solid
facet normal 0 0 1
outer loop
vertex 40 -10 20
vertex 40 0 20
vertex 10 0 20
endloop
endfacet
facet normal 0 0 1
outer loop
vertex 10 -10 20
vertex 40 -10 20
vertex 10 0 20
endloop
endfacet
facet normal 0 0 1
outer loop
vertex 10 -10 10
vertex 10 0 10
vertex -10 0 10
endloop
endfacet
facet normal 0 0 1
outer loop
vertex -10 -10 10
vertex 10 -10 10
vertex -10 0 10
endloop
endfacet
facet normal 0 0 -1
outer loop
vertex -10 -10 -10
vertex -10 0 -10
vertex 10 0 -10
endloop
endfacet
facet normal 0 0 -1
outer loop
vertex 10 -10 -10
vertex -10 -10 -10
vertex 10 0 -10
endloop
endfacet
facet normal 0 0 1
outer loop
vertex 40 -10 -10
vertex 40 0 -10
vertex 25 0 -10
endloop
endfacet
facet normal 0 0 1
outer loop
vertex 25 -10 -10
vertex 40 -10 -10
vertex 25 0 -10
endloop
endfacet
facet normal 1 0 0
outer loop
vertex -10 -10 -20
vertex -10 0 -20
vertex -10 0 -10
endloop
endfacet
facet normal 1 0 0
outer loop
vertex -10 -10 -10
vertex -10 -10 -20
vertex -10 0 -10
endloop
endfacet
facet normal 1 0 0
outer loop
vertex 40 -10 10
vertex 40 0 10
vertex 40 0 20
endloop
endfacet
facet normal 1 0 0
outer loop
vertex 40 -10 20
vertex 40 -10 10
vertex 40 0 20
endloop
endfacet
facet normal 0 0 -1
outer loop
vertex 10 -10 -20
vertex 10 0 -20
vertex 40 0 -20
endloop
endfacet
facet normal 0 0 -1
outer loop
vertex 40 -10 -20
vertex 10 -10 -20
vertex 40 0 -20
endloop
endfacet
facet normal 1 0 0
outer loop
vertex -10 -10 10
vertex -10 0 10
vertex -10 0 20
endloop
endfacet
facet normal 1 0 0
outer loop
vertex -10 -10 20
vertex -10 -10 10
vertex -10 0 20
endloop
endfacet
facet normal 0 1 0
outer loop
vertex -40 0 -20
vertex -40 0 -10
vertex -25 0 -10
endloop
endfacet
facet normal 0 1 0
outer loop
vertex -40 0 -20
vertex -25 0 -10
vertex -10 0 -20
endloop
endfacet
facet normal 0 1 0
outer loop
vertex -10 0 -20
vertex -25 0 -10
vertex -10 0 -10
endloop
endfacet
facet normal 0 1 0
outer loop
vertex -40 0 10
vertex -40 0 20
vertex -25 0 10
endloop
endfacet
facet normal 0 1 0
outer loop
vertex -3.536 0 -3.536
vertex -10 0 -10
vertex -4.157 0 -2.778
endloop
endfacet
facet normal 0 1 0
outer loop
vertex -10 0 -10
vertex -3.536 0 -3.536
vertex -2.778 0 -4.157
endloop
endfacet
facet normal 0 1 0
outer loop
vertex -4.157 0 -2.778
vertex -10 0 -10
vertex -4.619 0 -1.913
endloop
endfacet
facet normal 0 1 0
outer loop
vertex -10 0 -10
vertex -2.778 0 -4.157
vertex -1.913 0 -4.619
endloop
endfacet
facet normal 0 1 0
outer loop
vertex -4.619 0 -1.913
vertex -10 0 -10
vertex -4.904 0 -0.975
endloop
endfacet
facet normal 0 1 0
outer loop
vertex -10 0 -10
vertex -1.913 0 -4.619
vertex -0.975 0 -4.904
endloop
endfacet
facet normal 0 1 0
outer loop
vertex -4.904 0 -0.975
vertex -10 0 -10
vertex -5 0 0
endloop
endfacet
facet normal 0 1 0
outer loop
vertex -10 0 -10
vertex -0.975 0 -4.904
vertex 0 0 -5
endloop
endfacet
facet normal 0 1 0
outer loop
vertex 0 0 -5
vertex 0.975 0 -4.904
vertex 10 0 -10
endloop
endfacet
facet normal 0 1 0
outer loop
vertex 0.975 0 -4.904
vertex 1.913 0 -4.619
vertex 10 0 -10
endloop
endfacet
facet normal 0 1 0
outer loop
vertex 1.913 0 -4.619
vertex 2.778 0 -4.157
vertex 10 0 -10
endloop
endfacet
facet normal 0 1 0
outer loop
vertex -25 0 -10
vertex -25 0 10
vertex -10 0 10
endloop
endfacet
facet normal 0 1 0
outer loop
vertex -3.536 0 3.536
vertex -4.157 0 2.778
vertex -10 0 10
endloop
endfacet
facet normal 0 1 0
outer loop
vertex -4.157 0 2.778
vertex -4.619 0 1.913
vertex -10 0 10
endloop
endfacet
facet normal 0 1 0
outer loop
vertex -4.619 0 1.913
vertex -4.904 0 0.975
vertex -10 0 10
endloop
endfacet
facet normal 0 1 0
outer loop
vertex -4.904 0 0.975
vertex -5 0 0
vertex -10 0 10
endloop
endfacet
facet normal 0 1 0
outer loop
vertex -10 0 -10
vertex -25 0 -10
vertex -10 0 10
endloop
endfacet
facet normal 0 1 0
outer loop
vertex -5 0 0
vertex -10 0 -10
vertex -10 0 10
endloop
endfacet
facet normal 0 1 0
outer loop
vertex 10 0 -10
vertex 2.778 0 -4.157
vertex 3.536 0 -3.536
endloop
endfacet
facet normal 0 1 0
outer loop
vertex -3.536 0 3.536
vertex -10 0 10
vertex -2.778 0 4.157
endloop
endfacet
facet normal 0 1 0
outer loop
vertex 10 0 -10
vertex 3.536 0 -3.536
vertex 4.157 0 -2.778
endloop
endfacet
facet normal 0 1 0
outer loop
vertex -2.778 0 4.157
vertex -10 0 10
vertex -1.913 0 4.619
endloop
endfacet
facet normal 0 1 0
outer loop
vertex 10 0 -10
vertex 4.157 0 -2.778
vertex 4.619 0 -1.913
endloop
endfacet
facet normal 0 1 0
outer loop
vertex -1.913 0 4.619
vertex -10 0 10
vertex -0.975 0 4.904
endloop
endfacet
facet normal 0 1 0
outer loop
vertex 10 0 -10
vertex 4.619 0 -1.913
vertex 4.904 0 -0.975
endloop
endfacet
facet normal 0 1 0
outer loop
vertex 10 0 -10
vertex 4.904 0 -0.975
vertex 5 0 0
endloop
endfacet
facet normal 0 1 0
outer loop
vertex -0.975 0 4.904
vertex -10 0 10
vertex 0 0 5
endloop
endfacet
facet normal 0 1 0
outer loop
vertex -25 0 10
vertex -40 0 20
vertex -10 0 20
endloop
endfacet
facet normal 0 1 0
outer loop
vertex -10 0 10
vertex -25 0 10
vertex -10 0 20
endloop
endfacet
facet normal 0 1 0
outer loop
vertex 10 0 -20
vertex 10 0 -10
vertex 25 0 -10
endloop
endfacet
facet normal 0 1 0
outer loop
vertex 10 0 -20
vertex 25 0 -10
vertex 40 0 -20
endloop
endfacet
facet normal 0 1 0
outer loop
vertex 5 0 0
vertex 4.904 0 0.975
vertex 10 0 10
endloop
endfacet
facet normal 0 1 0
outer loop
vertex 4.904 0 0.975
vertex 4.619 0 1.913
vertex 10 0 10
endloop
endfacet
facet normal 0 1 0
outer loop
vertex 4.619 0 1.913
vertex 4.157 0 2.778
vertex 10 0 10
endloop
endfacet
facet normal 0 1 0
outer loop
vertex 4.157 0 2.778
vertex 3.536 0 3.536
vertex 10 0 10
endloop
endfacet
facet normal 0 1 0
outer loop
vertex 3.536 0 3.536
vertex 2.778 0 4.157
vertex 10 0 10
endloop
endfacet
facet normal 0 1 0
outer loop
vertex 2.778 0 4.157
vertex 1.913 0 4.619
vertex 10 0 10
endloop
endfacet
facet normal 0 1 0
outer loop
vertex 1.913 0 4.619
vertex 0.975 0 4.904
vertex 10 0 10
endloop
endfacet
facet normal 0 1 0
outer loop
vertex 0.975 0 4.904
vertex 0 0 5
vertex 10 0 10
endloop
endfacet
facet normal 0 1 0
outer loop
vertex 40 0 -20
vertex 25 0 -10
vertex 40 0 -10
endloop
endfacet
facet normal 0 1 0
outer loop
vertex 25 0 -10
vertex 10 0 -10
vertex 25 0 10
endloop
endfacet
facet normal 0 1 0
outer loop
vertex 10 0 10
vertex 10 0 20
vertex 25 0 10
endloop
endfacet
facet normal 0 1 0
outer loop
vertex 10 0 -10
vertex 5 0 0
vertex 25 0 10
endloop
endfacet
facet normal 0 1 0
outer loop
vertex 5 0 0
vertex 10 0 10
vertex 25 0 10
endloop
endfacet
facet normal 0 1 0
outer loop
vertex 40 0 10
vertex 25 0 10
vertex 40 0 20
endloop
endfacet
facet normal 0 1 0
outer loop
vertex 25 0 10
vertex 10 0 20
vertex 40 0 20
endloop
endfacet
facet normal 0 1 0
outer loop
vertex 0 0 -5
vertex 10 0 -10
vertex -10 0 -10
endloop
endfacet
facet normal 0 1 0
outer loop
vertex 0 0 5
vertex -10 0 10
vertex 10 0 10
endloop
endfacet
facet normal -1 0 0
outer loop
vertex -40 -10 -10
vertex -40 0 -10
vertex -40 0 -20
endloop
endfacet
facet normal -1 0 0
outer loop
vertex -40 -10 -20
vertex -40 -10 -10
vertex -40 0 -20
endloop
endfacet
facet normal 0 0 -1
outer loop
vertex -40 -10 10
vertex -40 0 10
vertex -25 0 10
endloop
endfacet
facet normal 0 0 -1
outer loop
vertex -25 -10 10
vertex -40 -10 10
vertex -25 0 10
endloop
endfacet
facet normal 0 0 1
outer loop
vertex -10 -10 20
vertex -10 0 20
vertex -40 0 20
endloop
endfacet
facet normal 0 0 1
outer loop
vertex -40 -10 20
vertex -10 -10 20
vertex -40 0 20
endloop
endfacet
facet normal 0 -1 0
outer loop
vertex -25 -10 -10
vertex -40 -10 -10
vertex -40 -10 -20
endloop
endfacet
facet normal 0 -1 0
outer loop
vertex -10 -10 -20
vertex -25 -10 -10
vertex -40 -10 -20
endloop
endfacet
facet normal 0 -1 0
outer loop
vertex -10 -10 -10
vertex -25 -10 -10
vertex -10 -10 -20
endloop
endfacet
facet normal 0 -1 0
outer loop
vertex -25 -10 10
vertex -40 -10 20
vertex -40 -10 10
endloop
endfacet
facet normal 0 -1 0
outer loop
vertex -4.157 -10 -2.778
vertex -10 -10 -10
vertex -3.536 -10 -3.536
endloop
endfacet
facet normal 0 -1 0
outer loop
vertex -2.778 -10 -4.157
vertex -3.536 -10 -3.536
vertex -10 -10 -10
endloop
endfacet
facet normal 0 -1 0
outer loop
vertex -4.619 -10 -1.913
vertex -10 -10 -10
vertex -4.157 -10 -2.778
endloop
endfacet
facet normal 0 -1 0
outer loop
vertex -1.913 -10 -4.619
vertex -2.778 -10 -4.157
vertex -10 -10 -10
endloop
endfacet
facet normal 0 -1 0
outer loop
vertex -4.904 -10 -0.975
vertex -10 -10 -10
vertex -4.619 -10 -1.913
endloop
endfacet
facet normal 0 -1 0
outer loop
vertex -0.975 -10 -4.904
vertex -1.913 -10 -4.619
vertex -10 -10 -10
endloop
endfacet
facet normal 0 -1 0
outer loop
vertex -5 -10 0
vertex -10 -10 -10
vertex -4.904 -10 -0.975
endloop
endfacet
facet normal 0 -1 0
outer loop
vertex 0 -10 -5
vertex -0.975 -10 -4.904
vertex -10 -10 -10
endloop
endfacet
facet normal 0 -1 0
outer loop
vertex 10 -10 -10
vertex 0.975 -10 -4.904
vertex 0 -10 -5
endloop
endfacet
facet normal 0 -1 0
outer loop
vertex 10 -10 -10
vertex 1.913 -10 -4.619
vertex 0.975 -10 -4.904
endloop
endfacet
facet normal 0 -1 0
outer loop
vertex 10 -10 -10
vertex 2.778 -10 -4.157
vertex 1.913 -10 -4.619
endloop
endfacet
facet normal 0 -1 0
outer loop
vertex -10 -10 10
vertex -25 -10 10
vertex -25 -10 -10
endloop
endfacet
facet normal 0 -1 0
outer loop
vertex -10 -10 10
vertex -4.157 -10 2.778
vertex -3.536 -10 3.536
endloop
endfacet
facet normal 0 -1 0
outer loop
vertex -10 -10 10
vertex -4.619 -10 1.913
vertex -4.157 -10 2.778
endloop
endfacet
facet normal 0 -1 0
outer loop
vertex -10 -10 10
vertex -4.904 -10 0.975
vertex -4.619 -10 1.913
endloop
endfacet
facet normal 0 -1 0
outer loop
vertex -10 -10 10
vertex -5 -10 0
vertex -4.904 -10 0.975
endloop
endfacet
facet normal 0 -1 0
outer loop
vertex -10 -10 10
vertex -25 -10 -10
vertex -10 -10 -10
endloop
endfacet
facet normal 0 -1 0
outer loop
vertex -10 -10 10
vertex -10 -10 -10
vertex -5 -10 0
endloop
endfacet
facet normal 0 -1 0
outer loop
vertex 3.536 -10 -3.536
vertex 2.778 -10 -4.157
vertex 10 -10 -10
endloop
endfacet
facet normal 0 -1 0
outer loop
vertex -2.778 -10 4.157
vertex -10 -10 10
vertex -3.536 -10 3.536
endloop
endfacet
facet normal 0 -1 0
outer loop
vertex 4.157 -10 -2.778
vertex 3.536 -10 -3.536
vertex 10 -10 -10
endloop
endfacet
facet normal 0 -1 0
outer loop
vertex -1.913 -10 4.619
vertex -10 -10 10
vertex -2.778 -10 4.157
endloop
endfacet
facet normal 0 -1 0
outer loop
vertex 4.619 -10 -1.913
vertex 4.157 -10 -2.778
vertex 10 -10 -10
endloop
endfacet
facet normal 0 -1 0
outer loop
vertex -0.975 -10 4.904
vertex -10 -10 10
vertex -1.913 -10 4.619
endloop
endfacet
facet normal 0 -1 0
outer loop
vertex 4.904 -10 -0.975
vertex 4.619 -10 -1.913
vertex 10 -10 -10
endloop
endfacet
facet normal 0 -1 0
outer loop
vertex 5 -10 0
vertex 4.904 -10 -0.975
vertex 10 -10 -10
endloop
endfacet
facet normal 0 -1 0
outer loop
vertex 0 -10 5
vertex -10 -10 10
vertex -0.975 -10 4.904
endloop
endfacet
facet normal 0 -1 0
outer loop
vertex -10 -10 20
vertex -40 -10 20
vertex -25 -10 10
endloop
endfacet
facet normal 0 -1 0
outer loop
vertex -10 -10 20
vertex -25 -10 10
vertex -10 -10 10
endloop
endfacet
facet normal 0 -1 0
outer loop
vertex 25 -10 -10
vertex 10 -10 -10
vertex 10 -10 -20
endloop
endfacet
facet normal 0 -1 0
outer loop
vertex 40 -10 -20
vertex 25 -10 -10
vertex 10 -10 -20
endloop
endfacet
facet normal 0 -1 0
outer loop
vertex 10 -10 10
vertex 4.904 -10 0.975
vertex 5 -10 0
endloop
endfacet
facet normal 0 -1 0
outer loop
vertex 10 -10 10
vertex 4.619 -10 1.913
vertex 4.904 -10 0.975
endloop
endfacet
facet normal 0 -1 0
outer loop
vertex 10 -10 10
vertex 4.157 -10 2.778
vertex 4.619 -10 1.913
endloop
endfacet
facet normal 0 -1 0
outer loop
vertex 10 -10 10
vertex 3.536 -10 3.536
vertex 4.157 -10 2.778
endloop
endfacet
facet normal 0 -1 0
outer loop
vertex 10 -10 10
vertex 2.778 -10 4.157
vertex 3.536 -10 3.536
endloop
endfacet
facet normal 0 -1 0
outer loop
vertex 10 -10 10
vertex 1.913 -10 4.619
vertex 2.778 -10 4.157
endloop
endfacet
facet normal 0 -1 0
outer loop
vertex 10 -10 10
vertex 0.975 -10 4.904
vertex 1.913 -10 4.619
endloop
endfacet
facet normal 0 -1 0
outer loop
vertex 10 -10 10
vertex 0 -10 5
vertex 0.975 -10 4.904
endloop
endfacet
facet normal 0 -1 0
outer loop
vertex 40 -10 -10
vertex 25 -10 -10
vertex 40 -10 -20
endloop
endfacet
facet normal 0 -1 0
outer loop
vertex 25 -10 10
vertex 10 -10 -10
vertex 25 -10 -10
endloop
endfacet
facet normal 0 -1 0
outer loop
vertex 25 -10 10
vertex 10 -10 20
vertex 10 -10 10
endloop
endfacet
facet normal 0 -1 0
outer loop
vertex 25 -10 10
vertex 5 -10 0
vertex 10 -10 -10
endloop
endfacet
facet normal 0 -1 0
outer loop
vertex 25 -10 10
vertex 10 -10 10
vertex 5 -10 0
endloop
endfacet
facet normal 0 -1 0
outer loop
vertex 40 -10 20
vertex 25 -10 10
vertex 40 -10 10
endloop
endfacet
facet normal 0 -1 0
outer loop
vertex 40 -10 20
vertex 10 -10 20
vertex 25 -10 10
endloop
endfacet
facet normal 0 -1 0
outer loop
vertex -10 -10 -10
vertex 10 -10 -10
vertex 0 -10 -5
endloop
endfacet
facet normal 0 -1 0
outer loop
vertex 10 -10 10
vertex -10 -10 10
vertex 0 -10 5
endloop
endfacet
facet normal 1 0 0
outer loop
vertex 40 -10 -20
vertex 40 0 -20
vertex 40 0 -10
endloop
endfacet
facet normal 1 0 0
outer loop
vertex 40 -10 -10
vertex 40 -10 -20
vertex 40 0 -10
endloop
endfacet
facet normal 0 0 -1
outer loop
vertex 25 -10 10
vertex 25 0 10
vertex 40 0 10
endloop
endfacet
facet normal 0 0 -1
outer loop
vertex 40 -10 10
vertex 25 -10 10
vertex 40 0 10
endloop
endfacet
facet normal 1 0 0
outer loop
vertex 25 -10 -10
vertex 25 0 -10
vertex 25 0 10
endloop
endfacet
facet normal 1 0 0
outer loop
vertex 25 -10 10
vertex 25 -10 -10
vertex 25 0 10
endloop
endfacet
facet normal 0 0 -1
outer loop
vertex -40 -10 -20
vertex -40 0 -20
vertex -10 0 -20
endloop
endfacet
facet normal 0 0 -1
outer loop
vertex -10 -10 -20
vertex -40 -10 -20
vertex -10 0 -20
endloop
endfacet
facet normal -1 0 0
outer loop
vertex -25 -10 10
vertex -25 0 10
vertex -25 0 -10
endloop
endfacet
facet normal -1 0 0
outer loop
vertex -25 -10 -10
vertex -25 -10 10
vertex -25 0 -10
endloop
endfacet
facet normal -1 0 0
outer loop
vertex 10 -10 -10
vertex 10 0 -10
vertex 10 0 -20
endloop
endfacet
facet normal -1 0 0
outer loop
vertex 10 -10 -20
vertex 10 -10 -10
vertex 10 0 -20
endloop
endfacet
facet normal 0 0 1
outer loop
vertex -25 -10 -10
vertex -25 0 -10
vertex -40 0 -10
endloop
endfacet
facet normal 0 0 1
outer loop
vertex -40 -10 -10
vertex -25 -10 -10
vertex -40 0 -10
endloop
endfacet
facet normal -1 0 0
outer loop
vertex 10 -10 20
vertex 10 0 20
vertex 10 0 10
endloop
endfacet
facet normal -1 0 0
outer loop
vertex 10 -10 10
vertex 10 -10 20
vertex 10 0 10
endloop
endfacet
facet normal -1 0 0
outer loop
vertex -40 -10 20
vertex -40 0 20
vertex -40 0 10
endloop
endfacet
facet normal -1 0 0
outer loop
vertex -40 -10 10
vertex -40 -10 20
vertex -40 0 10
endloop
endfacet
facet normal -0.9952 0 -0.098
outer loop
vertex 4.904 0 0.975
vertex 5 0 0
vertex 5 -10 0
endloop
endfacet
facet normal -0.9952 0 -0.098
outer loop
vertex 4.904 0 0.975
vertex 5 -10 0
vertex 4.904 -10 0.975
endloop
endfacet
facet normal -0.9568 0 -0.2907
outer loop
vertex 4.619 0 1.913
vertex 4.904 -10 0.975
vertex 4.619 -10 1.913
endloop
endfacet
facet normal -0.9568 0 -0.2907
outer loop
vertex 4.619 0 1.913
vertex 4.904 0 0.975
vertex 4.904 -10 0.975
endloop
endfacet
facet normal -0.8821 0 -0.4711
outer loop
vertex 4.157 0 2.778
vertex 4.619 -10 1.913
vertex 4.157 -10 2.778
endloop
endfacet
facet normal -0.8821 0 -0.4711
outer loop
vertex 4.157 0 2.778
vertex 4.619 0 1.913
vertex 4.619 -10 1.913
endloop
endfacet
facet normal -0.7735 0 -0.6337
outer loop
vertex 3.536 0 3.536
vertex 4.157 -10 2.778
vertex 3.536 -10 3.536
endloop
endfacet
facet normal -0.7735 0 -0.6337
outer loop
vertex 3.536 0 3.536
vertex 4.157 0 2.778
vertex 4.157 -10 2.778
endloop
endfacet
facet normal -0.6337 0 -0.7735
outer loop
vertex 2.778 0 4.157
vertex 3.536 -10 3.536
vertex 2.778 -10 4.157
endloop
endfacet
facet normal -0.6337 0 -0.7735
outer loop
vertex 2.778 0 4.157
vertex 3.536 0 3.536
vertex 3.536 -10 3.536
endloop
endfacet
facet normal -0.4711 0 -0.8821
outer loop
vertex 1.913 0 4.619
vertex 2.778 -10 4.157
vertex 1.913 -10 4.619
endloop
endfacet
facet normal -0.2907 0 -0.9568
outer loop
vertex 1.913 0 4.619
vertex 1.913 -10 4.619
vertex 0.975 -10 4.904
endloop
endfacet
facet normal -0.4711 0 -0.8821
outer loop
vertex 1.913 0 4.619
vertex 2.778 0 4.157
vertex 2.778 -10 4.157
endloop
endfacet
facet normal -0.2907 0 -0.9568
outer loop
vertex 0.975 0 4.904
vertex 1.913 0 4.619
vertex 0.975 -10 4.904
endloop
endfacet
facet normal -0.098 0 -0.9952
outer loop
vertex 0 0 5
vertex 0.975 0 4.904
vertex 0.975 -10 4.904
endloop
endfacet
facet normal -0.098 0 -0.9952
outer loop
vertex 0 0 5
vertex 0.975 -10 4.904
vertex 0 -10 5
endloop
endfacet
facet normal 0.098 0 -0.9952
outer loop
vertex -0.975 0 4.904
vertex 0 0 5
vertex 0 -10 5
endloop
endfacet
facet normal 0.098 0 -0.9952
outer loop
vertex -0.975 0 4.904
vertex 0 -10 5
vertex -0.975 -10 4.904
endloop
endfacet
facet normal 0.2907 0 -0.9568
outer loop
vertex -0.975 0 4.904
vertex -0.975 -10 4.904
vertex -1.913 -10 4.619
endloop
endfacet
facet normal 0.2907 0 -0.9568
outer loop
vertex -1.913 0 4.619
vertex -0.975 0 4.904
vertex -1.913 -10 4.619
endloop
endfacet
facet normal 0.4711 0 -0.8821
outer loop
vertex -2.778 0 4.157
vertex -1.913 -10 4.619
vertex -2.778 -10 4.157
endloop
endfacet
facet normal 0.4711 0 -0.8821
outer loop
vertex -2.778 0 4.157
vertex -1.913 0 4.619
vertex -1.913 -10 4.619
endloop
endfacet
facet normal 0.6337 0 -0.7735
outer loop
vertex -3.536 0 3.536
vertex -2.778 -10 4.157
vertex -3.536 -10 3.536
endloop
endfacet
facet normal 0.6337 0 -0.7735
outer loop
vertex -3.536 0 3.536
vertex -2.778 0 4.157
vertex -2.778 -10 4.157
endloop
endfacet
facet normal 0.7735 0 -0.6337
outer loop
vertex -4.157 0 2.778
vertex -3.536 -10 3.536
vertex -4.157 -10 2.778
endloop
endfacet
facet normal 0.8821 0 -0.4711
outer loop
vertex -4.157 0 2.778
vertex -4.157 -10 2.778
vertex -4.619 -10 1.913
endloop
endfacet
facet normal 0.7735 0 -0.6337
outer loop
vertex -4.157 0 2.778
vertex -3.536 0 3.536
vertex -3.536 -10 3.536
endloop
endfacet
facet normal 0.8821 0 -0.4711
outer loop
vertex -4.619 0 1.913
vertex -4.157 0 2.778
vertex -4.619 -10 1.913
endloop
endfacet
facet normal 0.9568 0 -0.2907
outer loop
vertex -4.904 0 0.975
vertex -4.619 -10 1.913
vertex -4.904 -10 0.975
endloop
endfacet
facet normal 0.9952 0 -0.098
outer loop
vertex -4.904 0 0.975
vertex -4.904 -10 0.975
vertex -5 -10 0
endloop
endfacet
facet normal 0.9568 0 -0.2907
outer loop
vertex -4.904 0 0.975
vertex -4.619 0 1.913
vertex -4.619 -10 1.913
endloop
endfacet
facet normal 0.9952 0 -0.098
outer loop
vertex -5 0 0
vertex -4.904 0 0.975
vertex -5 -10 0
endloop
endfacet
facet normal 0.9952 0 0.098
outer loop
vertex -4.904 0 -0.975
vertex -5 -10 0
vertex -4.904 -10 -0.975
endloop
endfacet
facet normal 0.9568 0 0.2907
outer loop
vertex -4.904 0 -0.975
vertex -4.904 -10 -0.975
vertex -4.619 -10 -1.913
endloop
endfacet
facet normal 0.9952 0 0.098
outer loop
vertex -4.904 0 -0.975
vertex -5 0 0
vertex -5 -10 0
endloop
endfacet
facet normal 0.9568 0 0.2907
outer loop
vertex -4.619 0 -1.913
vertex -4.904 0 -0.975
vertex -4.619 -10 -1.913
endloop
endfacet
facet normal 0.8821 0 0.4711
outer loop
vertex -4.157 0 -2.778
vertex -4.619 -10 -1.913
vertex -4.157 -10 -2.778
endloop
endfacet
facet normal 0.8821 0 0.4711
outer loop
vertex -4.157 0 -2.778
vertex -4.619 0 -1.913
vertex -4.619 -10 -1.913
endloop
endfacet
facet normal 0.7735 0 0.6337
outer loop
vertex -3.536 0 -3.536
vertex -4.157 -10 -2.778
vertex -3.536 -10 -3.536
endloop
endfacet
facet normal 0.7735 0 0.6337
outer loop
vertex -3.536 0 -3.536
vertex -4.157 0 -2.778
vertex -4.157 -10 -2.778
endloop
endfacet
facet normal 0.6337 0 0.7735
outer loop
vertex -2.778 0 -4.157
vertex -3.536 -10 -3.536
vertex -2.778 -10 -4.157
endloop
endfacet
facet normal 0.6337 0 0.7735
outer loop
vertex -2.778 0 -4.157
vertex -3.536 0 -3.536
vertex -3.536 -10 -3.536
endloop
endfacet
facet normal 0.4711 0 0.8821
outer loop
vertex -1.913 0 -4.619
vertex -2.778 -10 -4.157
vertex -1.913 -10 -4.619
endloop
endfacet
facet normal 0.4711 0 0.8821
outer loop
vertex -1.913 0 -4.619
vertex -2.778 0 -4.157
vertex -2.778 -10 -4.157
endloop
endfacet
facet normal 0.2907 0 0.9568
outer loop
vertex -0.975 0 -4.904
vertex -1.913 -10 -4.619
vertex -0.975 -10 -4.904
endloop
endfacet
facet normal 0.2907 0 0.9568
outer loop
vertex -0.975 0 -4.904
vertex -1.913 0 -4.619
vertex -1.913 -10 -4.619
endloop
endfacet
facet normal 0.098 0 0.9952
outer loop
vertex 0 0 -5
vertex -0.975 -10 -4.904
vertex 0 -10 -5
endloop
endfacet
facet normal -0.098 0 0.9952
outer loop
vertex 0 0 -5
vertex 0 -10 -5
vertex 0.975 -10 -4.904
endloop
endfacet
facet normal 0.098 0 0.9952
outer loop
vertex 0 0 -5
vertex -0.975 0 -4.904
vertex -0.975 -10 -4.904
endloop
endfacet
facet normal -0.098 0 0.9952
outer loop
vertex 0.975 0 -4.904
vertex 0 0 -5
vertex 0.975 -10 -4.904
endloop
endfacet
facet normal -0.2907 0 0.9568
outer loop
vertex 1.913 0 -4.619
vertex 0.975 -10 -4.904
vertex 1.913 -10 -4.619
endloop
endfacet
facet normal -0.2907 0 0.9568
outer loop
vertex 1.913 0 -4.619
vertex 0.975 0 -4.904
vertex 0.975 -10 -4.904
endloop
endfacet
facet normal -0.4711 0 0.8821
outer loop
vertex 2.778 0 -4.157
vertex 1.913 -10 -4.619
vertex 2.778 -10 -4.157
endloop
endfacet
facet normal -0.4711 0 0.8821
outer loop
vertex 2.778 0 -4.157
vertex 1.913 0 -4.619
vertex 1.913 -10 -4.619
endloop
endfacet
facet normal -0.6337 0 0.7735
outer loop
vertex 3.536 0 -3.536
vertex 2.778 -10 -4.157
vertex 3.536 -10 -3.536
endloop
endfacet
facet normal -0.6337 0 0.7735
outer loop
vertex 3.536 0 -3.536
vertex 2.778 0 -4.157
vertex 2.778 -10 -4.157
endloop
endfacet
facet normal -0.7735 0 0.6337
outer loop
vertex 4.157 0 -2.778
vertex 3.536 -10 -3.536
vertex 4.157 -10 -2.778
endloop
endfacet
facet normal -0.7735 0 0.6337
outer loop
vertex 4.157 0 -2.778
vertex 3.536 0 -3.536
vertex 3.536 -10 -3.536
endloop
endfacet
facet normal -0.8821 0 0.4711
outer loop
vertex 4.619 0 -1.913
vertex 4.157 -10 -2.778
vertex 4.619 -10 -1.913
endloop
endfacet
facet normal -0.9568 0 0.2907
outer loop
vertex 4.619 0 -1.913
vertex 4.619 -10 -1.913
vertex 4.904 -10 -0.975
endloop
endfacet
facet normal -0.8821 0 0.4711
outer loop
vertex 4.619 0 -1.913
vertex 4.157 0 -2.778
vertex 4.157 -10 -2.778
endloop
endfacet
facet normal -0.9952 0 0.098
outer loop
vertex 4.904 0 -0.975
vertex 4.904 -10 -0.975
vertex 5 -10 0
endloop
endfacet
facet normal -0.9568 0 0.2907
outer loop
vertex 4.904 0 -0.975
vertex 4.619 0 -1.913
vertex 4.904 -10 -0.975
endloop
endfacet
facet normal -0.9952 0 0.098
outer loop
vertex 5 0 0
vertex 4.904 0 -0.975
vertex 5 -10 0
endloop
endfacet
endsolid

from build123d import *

# Parameters (mm, degrees)
F0_R     = 5
F1_DEPTH = 10


with BuildPart() as f1:
    # F0 (on Front) → F1 (new body)
    with BuildSketch(Plane.XZ):
        Polygon((-10, -10), (0, -10), (10, -10), (10, -20), (40, -20), (40, -10), (25, -10), (25, 10), (40, 10), (40, 20), (10, 20), (10, 10), (0, 10), (-10, 10), (-10, 20), (-40, 20), (-40, 10), (-25, 10), (-25, -10), (-40, -10), (-40, -20), (-10, -20), align=None)
        Circle(F0_R, mode=Mode.SUBTRACT)
    extrude(amount=F1_DEPTH)


solid = f1.part
